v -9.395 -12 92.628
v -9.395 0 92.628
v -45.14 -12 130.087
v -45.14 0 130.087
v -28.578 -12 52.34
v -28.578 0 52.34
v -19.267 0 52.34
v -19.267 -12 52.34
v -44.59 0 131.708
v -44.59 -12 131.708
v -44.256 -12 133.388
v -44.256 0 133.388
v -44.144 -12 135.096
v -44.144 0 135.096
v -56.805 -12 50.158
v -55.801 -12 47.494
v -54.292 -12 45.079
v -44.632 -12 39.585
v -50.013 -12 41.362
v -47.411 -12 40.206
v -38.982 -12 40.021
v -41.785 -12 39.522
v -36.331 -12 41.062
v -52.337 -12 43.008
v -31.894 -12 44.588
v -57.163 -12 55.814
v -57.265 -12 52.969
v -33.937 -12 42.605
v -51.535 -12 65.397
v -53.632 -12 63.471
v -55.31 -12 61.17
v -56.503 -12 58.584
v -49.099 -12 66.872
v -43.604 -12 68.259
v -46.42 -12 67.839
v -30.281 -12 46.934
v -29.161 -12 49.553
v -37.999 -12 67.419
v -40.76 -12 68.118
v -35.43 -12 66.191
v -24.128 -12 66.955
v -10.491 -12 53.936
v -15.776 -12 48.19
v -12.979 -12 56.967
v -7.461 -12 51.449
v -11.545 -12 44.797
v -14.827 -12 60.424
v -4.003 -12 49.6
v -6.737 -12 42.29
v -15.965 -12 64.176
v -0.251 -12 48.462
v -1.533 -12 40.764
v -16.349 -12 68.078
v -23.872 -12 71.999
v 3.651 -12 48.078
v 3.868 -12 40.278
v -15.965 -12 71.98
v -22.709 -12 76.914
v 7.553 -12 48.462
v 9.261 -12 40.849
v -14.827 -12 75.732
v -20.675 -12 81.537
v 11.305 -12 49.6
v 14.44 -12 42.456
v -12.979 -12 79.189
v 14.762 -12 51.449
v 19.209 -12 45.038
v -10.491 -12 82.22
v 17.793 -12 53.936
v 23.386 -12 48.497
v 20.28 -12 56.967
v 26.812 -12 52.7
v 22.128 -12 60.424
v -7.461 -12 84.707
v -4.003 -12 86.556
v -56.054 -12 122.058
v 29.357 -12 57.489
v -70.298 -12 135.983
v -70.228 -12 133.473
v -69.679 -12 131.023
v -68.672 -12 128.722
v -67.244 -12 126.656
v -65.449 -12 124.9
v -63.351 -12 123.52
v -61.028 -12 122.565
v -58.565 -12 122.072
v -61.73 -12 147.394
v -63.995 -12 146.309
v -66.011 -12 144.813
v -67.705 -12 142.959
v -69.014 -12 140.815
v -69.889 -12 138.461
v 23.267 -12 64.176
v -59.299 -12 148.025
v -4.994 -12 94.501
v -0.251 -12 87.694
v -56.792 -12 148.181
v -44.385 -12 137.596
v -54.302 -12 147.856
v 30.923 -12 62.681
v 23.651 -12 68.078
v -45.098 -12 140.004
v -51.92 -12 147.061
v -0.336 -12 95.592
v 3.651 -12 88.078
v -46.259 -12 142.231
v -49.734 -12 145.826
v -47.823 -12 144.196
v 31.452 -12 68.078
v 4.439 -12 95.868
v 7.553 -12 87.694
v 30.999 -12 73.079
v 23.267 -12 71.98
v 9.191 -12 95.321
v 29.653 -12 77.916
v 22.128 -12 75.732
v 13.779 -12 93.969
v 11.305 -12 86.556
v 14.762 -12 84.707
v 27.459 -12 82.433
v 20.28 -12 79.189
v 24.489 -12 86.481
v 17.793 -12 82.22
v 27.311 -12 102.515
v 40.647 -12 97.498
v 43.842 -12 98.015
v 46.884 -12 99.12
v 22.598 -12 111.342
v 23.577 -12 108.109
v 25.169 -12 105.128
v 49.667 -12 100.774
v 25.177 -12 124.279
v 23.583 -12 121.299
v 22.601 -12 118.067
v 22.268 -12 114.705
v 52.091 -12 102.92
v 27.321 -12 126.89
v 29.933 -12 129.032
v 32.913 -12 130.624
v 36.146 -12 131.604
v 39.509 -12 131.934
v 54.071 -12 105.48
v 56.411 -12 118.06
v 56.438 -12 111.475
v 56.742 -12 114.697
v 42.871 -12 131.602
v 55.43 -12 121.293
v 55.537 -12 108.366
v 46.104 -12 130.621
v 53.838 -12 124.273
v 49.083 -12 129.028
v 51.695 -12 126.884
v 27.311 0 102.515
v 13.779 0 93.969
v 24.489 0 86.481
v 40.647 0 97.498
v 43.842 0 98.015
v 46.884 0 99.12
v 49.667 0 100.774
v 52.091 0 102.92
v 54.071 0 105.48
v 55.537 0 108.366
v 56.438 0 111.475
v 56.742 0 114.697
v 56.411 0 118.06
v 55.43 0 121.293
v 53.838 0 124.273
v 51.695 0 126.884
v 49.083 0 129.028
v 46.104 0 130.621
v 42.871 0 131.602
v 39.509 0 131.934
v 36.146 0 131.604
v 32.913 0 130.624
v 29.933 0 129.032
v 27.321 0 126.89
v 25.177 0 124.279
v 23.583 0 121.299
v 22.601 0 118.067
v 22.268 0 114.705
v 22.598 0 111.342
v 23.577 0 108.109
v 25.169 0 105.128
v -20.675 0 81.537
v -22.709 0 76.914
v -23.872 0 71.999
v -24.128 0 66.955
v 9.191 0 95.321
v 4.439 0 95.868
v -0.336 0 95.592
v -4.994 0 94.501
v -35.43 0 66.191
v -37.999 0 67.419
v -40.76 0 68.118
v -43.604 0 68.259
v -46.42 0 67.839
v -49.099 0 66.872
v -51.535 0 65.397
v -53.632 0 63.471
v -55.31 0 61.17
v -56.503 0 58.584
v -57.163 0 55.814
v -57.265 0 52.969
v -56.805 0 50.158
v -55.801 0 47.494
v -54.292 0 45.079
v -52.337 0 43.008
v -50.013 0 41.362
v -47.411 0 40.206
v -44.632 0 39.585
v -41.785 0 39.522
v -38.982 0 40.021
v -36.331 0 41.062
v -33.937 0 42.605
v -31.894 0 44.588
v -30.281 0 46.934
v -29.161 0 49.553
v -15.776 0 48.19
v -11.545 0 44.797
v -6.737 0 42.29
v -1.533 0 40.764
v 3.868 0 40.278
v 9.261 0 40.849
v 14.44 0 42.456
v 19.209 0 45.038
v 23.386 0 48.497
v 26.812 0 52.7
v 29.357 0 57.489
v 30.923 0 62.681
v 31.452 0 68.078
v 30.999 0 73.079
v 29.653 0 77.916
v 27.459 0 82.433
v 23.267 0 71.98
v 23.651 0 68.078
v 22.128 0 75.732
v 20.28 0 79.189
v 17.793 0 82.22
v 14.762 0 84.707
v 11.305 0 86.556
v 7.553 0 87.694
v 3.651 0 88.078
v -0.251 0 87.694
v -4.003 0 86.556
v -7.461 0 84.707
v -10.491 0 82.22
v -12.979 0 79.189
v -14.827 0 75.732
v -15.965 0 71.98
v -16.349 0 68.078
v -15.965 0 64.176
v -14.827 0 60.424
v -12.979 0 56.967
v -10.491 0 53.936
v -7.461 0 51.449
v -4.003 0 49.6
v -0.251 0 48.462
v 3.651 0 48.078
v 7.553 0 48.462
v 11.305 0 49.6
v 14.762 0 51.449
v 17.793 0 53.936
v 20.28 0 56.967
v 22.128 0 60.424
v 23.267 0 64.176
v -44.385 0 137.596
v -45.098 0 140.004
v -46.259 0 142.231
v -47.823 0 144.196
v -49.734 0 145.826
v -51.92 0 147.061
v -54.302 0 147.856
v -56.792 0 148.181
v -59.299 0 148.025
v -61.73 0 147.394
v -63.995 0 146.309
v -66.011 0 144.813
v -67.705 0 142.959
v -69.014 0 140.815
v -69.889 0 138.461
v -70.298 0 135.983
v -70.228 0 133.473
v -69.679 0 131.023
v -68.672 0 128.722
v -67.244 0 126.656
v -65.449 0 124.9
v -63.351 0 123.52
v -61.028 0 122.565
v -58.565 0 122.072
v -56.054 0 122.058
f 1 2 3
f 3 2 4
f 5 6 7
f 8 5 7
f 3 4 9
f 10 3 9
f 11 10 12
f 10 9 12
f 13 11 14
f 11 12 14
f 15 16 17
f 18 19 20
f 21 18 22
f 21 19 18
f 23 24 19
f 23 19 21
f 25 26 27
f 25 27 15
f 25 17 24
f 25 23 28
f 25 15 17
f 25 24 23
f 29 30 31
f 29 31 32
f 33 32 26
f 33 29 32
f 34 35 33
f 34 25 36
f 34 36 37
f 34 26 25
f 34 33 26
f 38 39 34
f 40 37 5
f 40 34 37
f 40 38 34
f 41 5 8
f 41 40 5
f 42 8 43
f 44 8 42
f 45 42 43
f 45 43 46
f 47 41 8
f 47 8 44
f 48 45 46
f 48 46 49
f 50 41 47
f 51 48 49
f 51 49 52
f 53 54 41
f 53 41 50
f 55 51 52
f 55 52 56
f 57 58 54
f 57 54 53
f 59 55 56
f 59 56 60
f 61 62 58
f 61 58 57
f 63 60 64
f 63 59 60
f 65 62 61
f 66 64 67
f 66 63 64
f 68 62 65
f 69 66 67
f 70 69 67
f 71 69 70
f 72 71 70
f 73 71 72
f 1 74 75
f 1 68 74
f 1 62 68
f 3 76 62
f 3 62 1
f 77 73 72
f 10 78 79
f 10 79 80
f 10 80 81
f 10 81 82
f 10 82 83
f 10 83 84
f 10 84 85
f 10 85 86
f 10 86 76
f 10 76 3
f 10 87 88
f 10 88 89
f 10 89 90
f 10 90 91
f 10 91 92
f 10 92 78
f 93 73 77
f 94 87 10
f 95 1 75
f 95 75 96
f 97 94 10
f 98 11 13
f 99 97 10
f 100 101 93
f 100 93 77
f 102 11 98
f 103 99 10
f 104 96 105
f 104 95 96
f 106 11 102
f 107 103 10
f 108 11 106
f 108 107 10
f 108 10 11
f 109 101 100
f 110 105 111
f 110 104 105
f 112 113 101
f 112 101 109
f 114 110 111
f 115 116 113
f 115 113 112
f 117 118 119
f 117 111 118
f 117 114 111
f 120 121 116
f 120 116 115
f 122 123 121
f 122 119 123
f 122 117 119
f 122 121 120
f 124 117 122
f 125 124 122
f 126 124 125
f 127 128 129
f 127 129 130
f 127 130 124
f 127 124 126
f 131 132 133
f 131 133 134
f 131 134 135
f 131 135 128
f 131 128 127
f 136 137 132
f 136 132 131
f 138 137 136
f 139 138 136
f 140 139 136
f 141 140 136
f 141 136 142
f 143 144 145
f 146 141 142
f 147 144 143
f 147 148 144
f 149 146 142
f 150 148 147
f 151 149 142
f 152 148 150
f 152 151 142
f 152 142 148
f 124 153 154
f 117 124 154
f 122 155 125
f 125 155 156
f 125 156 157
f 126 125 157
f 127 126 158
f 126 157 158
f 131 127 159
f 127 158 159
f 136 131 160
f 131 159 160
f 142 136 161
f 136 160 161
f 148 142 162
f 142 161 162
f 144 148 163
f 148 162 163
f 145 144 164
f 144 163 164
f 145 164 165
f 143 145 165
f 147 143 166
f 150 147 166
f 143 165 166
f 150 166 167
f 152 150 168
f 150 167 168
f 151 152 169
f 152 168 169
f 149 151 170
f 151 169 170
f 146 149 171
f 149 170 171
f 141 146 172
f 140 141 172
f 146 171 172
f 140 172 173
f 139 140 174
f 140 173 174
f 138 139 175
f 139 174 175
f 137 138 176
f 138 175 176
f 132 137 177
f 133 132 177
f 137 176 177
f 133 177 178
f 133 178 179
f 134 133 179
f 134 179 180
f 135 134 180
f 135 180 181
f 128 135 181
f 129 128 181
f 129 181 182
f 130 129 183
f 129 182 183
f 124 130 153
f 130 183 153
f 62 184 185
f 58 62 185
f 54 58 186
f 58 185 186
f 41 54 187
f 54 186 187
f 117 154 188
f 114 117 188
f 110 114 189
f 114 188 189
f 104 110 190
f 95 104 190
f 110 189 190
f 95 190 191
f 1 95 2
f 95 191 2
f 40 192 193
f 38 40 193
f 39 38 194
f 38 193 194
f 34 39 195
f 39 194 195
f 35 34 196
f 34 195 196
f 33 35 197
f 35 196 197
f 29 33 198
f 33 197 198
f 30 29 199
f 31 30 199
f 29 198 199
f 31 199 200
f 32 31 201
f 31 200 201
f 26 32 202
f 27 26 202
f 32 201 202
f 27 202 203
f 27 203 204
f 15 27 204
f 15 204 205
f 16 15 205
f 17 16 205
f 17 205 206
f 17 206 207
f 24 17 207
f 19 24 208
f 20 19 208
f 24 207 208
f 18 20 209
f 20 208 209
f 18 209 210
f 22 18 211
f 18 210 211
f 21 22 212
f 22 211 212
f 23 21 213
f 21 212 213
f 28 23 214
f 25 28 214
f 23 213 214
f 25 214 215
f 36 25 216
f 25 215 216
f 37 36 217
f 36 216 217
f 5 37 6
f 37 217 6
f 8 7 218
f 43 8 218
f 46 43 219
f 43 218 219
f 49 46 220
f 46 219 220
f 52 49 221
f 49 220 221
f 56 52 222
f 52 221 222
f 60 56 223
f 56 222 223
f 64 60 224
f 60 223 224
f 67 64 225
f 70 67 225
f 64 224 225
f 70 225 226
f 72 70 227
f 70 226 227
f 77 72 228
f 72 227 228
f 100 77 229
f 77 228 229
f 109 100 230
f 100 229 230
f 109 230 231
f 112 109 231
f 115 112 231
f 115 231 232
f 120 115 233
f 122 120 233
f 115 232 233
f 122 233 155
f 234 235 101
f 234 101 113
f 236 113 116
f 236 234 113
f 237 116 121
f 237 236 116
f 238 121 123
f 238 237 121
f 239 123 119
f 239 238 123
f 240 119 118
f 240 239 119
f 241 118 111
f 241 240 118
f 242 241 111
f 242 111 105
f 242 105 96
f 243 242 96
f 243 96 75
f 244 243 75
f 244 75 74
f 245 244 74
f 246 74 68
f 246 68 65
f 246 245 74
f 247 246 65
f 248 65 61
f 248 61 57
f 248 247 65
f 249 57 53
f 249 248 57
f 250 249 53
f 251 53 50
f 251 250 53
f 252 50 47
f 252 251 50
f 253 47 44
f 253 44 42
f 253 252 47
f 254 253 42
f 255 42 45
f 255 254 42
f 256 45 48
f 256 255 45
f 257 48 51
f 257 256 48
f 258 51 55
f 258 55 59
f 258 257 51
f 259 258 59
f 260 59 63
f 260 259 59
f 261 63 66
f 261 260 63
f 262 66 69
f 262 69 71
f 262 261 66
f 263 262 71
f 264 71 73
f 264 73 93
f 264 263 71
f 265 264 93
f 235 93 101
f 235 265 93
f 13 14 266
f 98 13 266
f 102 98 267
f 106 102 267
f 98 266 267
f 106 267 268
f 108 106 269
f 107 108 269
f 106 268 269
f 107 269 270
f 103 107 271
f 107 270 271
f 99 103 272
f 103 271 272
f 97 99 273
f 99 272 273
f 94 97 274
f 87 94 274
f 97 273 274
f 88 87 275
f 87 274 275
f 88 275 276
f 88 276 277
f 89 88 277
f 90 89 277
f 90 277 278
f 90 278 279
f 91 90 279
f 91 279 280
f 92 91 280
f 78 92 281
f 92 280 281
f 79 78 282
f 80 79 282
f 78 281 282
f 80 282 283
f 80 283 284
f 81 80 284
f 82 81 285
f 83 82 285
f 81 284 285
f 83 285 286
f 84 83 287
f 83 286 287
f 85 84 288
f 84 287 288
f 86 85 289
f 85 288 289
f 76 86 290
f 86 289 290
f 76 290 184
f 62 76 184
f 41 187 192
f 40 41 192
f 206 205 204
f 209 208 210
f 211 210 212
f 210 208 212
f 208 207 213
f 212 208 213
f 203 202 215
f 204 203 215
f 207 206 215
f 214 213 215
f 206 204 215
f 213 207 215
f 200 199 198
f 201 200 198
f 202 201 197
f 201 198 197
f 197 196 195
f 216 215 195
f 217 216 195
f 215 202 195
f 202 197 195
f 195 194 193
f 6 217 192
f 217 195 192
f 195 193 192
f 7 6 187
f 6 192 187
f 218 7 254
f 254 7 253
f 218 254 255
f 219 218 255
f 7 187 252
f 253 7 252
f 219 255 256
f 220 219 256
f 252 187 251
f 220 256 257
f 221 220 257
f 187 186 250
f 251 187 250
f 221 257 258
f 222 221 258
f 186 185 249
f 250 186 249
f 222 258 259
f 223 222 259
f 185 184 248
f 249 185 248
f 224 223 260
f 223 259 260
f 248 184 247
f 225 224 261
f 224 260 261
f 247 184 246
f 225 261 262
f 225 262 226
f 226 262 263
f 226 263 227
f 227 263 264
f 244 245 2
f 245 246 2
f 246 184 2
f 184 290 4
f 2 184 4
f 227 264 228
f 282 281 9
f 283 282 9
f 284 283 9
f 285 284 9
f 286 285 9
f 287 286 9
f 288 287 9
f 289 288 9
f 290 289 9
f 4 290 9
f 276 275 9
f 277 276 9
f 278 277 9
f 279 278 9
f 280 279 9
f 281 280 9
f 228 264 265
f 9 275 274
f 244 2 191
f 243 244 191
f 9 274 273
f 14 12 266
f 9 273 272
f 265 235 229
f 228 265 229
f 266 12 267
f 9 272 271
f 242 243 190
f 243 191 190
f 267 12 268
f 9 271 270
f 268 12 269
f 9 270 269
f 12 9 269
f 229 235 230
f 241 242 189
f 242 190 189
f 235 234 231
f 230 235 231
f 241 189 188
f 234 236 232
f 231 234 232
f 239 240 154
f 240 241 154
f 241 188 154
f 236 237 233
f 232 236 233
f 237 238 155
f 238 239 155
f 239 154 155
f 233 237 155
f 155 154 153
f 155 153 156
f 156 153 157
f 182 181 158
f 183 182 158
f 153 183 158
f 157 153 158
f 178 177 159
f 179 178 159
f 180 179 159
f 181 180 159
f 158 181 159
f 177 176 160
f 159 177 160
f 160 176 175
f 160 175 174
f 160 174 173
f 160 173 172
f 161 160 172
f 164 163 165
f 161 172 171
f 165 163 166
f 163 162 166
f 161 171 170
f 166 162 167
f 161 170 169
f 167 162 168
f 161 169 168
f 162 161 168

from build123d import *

# Parameters (mm, degrees)
F0_R     = 20
F1_DEPTH = 12


with BuildPart() as f1:
    # F0 (on Front) → F1 (new body)
    with BuildSketch(Plane.XZ):
        with BuildLine():
            ThreePointArc((-45.1402234044, 130.0868427911), (-44.3953824054, 132.5425897679), (-44.1438812161, 135.0964551676))
            ThreePointArc((-44.1438812161, 135.0964551676), (-66.902815449, 143.9263254526), (-56.0541389315, 122.0575825878))
            ThreePointArc((-56.0541389315, 122.0575825878), (-49.477735957, 124.5505867663), (-45.1402234044, 130.0868427911))
        make_face()
        with BuildLine():
            ThreePointArc((-45.1402234044, 130.0868427911), (-49.477735957, 124.5505867663), (-56.0541389315, 122.0575825878))
            Line((-56.0541389315, 122.0575825878), (-20.6749169362, 81.5374788645))
            ThreePointArc((-20.6749169362, 81.5374788645), (-15.8403911831, 87.9020164198), (-9.3949234629, 92.6281060737))
            Line((-9.3949234629, 92.6281060737), (-45.1402234044, 130.0868427911))
        make_face()
        with BuildLine():
            ThreePointArc((-9.3949234629, 92.6281060737), (-15.8403911831, 87.9020164198), (-20.6749169362, 81.5374788645))
            ThreePointArc((-20.6749169362, 81.5374788645), (-23.4023159827, 74.4832519056), (-24.1275682376, 66.9549830001))
            ThreePointArc((-24.1275682376, 66.9549830001), (-22.7294741415, 59.3041231282), (-19.2667531461, 52.3399370889))
            ThreePointArc((-19.2667531461, 52.3399370889), (11.8900093443, 41.5257597874), (31.4519924852, 68.0779554628))
            ThreePointArc((31.4519924852, 68.0779554628), (29.653096416, 77.915975697), (24.4892064897, 86.4808405543))
            ThreePointArc((24.4892064897, 86.4808405543), (19.5802695472, 90.8629659463), (13.7789121862, 93.968595935))
            ThreePointArc((13.7789121862, 93.968595935), (2.0453958796, 95.8326850768), (-9.3949234629, 92.6281060737))
        make_face()
        with Locations((3.6508674214, 68.0779554628)):
            Circle(F0_R, mode=Mode.SUBTRACT)
        with BuildLine():
            ThreePointArc((-19.2667531461, 52.3399370889), (-22.7294741415, 59.3041231282), (-24.1275682376, 66.9549830001))
            Line((-24.1275682376, 66.9549830001), (-35.430176559, 66.1910267504))
            ThreePointArc((-35.430176559, 66.1910267504), (-32.4777200289, 63.8186090674), (-30.2460369862, 60.7583875033))
            ThreePointArc((-30.2460369862, 60.7583875033), (-28.9402630028, 57.4278194818), (-28.4958610621, 53.8781383755))
            ThreePointArc((-28.4958610621, 53.8781383755), (-28.5164751814, 53.1079350682), (-28.5782585148, 52.3399370889))
            Line((-28.5782585148, 52.3399370889), (-19.2667531461, 52.3399370889))
        make_face()
        with BuildLine():
            Line((27.3106167301, 102.5154178797), (13.7789121862, 93.968595935))
            ThreePointArc((13.7789121862, 93.968595935), (19.5802695472, 90.8629659463), (24.4892064897, 86.4808405543))
            Line((24.4892064897, 86.4808405543), (40.6466048753, 97.4983605522))
            ThreePointArc((40.6466048753, 97.4983605522), (33.435945257, 98.5644139139), (27.3106167301, 102.5154178797))
        make_face()
        with BuildLine():
            Line((-30.2460369862, 60.7583875033), (-35.430176559, 66.1910267504))
            ThreePointArc((-35.430176559, 66.1910267504), (-55.8007056513, 47.4937303618), (-28.5782585148, 52.3399370889))
            ThreePointArc((-28.5782585148, 52.3399370889), (-28.5164751814, 53.1079350682), (-28.4958610621, 53.8781383755))
            ThreePointArc((-28.4958610621, 53.8781383755), (-28.9402630028, 57.4278194818), (-30.2460369862, 60.7583875033))
        make_face()
        with BuildLine():
            ThreePointArc((-30.2460369862, 60.7583875033), (-32.4777200289, 63.8186090674), (-35.430176559, 66.1910267504))
            Line((-35.430176559, 66.1910267504), (-30.2460369862, 60.7583875033))
        make_face()
        with BuildLine():
            ThreePointArc((56.7421202866, 114.697404157), (32.9131115376, 130.6239087268), (27.3106167301, 102.5154178797))
            ThreePointArc((27.3106167301, 102.5154178797), (33.435945257, 98.5644139139), (40.6466048753, 97.4983605522))
            ThreePointArc((40.6466048753, 97.4983605522), (52.0906202883, 102.9195359578), (56.7421202866, 114.697404157))
        make_face()
    extrude(amount=F1_DEPTH)


solid = f1.part
